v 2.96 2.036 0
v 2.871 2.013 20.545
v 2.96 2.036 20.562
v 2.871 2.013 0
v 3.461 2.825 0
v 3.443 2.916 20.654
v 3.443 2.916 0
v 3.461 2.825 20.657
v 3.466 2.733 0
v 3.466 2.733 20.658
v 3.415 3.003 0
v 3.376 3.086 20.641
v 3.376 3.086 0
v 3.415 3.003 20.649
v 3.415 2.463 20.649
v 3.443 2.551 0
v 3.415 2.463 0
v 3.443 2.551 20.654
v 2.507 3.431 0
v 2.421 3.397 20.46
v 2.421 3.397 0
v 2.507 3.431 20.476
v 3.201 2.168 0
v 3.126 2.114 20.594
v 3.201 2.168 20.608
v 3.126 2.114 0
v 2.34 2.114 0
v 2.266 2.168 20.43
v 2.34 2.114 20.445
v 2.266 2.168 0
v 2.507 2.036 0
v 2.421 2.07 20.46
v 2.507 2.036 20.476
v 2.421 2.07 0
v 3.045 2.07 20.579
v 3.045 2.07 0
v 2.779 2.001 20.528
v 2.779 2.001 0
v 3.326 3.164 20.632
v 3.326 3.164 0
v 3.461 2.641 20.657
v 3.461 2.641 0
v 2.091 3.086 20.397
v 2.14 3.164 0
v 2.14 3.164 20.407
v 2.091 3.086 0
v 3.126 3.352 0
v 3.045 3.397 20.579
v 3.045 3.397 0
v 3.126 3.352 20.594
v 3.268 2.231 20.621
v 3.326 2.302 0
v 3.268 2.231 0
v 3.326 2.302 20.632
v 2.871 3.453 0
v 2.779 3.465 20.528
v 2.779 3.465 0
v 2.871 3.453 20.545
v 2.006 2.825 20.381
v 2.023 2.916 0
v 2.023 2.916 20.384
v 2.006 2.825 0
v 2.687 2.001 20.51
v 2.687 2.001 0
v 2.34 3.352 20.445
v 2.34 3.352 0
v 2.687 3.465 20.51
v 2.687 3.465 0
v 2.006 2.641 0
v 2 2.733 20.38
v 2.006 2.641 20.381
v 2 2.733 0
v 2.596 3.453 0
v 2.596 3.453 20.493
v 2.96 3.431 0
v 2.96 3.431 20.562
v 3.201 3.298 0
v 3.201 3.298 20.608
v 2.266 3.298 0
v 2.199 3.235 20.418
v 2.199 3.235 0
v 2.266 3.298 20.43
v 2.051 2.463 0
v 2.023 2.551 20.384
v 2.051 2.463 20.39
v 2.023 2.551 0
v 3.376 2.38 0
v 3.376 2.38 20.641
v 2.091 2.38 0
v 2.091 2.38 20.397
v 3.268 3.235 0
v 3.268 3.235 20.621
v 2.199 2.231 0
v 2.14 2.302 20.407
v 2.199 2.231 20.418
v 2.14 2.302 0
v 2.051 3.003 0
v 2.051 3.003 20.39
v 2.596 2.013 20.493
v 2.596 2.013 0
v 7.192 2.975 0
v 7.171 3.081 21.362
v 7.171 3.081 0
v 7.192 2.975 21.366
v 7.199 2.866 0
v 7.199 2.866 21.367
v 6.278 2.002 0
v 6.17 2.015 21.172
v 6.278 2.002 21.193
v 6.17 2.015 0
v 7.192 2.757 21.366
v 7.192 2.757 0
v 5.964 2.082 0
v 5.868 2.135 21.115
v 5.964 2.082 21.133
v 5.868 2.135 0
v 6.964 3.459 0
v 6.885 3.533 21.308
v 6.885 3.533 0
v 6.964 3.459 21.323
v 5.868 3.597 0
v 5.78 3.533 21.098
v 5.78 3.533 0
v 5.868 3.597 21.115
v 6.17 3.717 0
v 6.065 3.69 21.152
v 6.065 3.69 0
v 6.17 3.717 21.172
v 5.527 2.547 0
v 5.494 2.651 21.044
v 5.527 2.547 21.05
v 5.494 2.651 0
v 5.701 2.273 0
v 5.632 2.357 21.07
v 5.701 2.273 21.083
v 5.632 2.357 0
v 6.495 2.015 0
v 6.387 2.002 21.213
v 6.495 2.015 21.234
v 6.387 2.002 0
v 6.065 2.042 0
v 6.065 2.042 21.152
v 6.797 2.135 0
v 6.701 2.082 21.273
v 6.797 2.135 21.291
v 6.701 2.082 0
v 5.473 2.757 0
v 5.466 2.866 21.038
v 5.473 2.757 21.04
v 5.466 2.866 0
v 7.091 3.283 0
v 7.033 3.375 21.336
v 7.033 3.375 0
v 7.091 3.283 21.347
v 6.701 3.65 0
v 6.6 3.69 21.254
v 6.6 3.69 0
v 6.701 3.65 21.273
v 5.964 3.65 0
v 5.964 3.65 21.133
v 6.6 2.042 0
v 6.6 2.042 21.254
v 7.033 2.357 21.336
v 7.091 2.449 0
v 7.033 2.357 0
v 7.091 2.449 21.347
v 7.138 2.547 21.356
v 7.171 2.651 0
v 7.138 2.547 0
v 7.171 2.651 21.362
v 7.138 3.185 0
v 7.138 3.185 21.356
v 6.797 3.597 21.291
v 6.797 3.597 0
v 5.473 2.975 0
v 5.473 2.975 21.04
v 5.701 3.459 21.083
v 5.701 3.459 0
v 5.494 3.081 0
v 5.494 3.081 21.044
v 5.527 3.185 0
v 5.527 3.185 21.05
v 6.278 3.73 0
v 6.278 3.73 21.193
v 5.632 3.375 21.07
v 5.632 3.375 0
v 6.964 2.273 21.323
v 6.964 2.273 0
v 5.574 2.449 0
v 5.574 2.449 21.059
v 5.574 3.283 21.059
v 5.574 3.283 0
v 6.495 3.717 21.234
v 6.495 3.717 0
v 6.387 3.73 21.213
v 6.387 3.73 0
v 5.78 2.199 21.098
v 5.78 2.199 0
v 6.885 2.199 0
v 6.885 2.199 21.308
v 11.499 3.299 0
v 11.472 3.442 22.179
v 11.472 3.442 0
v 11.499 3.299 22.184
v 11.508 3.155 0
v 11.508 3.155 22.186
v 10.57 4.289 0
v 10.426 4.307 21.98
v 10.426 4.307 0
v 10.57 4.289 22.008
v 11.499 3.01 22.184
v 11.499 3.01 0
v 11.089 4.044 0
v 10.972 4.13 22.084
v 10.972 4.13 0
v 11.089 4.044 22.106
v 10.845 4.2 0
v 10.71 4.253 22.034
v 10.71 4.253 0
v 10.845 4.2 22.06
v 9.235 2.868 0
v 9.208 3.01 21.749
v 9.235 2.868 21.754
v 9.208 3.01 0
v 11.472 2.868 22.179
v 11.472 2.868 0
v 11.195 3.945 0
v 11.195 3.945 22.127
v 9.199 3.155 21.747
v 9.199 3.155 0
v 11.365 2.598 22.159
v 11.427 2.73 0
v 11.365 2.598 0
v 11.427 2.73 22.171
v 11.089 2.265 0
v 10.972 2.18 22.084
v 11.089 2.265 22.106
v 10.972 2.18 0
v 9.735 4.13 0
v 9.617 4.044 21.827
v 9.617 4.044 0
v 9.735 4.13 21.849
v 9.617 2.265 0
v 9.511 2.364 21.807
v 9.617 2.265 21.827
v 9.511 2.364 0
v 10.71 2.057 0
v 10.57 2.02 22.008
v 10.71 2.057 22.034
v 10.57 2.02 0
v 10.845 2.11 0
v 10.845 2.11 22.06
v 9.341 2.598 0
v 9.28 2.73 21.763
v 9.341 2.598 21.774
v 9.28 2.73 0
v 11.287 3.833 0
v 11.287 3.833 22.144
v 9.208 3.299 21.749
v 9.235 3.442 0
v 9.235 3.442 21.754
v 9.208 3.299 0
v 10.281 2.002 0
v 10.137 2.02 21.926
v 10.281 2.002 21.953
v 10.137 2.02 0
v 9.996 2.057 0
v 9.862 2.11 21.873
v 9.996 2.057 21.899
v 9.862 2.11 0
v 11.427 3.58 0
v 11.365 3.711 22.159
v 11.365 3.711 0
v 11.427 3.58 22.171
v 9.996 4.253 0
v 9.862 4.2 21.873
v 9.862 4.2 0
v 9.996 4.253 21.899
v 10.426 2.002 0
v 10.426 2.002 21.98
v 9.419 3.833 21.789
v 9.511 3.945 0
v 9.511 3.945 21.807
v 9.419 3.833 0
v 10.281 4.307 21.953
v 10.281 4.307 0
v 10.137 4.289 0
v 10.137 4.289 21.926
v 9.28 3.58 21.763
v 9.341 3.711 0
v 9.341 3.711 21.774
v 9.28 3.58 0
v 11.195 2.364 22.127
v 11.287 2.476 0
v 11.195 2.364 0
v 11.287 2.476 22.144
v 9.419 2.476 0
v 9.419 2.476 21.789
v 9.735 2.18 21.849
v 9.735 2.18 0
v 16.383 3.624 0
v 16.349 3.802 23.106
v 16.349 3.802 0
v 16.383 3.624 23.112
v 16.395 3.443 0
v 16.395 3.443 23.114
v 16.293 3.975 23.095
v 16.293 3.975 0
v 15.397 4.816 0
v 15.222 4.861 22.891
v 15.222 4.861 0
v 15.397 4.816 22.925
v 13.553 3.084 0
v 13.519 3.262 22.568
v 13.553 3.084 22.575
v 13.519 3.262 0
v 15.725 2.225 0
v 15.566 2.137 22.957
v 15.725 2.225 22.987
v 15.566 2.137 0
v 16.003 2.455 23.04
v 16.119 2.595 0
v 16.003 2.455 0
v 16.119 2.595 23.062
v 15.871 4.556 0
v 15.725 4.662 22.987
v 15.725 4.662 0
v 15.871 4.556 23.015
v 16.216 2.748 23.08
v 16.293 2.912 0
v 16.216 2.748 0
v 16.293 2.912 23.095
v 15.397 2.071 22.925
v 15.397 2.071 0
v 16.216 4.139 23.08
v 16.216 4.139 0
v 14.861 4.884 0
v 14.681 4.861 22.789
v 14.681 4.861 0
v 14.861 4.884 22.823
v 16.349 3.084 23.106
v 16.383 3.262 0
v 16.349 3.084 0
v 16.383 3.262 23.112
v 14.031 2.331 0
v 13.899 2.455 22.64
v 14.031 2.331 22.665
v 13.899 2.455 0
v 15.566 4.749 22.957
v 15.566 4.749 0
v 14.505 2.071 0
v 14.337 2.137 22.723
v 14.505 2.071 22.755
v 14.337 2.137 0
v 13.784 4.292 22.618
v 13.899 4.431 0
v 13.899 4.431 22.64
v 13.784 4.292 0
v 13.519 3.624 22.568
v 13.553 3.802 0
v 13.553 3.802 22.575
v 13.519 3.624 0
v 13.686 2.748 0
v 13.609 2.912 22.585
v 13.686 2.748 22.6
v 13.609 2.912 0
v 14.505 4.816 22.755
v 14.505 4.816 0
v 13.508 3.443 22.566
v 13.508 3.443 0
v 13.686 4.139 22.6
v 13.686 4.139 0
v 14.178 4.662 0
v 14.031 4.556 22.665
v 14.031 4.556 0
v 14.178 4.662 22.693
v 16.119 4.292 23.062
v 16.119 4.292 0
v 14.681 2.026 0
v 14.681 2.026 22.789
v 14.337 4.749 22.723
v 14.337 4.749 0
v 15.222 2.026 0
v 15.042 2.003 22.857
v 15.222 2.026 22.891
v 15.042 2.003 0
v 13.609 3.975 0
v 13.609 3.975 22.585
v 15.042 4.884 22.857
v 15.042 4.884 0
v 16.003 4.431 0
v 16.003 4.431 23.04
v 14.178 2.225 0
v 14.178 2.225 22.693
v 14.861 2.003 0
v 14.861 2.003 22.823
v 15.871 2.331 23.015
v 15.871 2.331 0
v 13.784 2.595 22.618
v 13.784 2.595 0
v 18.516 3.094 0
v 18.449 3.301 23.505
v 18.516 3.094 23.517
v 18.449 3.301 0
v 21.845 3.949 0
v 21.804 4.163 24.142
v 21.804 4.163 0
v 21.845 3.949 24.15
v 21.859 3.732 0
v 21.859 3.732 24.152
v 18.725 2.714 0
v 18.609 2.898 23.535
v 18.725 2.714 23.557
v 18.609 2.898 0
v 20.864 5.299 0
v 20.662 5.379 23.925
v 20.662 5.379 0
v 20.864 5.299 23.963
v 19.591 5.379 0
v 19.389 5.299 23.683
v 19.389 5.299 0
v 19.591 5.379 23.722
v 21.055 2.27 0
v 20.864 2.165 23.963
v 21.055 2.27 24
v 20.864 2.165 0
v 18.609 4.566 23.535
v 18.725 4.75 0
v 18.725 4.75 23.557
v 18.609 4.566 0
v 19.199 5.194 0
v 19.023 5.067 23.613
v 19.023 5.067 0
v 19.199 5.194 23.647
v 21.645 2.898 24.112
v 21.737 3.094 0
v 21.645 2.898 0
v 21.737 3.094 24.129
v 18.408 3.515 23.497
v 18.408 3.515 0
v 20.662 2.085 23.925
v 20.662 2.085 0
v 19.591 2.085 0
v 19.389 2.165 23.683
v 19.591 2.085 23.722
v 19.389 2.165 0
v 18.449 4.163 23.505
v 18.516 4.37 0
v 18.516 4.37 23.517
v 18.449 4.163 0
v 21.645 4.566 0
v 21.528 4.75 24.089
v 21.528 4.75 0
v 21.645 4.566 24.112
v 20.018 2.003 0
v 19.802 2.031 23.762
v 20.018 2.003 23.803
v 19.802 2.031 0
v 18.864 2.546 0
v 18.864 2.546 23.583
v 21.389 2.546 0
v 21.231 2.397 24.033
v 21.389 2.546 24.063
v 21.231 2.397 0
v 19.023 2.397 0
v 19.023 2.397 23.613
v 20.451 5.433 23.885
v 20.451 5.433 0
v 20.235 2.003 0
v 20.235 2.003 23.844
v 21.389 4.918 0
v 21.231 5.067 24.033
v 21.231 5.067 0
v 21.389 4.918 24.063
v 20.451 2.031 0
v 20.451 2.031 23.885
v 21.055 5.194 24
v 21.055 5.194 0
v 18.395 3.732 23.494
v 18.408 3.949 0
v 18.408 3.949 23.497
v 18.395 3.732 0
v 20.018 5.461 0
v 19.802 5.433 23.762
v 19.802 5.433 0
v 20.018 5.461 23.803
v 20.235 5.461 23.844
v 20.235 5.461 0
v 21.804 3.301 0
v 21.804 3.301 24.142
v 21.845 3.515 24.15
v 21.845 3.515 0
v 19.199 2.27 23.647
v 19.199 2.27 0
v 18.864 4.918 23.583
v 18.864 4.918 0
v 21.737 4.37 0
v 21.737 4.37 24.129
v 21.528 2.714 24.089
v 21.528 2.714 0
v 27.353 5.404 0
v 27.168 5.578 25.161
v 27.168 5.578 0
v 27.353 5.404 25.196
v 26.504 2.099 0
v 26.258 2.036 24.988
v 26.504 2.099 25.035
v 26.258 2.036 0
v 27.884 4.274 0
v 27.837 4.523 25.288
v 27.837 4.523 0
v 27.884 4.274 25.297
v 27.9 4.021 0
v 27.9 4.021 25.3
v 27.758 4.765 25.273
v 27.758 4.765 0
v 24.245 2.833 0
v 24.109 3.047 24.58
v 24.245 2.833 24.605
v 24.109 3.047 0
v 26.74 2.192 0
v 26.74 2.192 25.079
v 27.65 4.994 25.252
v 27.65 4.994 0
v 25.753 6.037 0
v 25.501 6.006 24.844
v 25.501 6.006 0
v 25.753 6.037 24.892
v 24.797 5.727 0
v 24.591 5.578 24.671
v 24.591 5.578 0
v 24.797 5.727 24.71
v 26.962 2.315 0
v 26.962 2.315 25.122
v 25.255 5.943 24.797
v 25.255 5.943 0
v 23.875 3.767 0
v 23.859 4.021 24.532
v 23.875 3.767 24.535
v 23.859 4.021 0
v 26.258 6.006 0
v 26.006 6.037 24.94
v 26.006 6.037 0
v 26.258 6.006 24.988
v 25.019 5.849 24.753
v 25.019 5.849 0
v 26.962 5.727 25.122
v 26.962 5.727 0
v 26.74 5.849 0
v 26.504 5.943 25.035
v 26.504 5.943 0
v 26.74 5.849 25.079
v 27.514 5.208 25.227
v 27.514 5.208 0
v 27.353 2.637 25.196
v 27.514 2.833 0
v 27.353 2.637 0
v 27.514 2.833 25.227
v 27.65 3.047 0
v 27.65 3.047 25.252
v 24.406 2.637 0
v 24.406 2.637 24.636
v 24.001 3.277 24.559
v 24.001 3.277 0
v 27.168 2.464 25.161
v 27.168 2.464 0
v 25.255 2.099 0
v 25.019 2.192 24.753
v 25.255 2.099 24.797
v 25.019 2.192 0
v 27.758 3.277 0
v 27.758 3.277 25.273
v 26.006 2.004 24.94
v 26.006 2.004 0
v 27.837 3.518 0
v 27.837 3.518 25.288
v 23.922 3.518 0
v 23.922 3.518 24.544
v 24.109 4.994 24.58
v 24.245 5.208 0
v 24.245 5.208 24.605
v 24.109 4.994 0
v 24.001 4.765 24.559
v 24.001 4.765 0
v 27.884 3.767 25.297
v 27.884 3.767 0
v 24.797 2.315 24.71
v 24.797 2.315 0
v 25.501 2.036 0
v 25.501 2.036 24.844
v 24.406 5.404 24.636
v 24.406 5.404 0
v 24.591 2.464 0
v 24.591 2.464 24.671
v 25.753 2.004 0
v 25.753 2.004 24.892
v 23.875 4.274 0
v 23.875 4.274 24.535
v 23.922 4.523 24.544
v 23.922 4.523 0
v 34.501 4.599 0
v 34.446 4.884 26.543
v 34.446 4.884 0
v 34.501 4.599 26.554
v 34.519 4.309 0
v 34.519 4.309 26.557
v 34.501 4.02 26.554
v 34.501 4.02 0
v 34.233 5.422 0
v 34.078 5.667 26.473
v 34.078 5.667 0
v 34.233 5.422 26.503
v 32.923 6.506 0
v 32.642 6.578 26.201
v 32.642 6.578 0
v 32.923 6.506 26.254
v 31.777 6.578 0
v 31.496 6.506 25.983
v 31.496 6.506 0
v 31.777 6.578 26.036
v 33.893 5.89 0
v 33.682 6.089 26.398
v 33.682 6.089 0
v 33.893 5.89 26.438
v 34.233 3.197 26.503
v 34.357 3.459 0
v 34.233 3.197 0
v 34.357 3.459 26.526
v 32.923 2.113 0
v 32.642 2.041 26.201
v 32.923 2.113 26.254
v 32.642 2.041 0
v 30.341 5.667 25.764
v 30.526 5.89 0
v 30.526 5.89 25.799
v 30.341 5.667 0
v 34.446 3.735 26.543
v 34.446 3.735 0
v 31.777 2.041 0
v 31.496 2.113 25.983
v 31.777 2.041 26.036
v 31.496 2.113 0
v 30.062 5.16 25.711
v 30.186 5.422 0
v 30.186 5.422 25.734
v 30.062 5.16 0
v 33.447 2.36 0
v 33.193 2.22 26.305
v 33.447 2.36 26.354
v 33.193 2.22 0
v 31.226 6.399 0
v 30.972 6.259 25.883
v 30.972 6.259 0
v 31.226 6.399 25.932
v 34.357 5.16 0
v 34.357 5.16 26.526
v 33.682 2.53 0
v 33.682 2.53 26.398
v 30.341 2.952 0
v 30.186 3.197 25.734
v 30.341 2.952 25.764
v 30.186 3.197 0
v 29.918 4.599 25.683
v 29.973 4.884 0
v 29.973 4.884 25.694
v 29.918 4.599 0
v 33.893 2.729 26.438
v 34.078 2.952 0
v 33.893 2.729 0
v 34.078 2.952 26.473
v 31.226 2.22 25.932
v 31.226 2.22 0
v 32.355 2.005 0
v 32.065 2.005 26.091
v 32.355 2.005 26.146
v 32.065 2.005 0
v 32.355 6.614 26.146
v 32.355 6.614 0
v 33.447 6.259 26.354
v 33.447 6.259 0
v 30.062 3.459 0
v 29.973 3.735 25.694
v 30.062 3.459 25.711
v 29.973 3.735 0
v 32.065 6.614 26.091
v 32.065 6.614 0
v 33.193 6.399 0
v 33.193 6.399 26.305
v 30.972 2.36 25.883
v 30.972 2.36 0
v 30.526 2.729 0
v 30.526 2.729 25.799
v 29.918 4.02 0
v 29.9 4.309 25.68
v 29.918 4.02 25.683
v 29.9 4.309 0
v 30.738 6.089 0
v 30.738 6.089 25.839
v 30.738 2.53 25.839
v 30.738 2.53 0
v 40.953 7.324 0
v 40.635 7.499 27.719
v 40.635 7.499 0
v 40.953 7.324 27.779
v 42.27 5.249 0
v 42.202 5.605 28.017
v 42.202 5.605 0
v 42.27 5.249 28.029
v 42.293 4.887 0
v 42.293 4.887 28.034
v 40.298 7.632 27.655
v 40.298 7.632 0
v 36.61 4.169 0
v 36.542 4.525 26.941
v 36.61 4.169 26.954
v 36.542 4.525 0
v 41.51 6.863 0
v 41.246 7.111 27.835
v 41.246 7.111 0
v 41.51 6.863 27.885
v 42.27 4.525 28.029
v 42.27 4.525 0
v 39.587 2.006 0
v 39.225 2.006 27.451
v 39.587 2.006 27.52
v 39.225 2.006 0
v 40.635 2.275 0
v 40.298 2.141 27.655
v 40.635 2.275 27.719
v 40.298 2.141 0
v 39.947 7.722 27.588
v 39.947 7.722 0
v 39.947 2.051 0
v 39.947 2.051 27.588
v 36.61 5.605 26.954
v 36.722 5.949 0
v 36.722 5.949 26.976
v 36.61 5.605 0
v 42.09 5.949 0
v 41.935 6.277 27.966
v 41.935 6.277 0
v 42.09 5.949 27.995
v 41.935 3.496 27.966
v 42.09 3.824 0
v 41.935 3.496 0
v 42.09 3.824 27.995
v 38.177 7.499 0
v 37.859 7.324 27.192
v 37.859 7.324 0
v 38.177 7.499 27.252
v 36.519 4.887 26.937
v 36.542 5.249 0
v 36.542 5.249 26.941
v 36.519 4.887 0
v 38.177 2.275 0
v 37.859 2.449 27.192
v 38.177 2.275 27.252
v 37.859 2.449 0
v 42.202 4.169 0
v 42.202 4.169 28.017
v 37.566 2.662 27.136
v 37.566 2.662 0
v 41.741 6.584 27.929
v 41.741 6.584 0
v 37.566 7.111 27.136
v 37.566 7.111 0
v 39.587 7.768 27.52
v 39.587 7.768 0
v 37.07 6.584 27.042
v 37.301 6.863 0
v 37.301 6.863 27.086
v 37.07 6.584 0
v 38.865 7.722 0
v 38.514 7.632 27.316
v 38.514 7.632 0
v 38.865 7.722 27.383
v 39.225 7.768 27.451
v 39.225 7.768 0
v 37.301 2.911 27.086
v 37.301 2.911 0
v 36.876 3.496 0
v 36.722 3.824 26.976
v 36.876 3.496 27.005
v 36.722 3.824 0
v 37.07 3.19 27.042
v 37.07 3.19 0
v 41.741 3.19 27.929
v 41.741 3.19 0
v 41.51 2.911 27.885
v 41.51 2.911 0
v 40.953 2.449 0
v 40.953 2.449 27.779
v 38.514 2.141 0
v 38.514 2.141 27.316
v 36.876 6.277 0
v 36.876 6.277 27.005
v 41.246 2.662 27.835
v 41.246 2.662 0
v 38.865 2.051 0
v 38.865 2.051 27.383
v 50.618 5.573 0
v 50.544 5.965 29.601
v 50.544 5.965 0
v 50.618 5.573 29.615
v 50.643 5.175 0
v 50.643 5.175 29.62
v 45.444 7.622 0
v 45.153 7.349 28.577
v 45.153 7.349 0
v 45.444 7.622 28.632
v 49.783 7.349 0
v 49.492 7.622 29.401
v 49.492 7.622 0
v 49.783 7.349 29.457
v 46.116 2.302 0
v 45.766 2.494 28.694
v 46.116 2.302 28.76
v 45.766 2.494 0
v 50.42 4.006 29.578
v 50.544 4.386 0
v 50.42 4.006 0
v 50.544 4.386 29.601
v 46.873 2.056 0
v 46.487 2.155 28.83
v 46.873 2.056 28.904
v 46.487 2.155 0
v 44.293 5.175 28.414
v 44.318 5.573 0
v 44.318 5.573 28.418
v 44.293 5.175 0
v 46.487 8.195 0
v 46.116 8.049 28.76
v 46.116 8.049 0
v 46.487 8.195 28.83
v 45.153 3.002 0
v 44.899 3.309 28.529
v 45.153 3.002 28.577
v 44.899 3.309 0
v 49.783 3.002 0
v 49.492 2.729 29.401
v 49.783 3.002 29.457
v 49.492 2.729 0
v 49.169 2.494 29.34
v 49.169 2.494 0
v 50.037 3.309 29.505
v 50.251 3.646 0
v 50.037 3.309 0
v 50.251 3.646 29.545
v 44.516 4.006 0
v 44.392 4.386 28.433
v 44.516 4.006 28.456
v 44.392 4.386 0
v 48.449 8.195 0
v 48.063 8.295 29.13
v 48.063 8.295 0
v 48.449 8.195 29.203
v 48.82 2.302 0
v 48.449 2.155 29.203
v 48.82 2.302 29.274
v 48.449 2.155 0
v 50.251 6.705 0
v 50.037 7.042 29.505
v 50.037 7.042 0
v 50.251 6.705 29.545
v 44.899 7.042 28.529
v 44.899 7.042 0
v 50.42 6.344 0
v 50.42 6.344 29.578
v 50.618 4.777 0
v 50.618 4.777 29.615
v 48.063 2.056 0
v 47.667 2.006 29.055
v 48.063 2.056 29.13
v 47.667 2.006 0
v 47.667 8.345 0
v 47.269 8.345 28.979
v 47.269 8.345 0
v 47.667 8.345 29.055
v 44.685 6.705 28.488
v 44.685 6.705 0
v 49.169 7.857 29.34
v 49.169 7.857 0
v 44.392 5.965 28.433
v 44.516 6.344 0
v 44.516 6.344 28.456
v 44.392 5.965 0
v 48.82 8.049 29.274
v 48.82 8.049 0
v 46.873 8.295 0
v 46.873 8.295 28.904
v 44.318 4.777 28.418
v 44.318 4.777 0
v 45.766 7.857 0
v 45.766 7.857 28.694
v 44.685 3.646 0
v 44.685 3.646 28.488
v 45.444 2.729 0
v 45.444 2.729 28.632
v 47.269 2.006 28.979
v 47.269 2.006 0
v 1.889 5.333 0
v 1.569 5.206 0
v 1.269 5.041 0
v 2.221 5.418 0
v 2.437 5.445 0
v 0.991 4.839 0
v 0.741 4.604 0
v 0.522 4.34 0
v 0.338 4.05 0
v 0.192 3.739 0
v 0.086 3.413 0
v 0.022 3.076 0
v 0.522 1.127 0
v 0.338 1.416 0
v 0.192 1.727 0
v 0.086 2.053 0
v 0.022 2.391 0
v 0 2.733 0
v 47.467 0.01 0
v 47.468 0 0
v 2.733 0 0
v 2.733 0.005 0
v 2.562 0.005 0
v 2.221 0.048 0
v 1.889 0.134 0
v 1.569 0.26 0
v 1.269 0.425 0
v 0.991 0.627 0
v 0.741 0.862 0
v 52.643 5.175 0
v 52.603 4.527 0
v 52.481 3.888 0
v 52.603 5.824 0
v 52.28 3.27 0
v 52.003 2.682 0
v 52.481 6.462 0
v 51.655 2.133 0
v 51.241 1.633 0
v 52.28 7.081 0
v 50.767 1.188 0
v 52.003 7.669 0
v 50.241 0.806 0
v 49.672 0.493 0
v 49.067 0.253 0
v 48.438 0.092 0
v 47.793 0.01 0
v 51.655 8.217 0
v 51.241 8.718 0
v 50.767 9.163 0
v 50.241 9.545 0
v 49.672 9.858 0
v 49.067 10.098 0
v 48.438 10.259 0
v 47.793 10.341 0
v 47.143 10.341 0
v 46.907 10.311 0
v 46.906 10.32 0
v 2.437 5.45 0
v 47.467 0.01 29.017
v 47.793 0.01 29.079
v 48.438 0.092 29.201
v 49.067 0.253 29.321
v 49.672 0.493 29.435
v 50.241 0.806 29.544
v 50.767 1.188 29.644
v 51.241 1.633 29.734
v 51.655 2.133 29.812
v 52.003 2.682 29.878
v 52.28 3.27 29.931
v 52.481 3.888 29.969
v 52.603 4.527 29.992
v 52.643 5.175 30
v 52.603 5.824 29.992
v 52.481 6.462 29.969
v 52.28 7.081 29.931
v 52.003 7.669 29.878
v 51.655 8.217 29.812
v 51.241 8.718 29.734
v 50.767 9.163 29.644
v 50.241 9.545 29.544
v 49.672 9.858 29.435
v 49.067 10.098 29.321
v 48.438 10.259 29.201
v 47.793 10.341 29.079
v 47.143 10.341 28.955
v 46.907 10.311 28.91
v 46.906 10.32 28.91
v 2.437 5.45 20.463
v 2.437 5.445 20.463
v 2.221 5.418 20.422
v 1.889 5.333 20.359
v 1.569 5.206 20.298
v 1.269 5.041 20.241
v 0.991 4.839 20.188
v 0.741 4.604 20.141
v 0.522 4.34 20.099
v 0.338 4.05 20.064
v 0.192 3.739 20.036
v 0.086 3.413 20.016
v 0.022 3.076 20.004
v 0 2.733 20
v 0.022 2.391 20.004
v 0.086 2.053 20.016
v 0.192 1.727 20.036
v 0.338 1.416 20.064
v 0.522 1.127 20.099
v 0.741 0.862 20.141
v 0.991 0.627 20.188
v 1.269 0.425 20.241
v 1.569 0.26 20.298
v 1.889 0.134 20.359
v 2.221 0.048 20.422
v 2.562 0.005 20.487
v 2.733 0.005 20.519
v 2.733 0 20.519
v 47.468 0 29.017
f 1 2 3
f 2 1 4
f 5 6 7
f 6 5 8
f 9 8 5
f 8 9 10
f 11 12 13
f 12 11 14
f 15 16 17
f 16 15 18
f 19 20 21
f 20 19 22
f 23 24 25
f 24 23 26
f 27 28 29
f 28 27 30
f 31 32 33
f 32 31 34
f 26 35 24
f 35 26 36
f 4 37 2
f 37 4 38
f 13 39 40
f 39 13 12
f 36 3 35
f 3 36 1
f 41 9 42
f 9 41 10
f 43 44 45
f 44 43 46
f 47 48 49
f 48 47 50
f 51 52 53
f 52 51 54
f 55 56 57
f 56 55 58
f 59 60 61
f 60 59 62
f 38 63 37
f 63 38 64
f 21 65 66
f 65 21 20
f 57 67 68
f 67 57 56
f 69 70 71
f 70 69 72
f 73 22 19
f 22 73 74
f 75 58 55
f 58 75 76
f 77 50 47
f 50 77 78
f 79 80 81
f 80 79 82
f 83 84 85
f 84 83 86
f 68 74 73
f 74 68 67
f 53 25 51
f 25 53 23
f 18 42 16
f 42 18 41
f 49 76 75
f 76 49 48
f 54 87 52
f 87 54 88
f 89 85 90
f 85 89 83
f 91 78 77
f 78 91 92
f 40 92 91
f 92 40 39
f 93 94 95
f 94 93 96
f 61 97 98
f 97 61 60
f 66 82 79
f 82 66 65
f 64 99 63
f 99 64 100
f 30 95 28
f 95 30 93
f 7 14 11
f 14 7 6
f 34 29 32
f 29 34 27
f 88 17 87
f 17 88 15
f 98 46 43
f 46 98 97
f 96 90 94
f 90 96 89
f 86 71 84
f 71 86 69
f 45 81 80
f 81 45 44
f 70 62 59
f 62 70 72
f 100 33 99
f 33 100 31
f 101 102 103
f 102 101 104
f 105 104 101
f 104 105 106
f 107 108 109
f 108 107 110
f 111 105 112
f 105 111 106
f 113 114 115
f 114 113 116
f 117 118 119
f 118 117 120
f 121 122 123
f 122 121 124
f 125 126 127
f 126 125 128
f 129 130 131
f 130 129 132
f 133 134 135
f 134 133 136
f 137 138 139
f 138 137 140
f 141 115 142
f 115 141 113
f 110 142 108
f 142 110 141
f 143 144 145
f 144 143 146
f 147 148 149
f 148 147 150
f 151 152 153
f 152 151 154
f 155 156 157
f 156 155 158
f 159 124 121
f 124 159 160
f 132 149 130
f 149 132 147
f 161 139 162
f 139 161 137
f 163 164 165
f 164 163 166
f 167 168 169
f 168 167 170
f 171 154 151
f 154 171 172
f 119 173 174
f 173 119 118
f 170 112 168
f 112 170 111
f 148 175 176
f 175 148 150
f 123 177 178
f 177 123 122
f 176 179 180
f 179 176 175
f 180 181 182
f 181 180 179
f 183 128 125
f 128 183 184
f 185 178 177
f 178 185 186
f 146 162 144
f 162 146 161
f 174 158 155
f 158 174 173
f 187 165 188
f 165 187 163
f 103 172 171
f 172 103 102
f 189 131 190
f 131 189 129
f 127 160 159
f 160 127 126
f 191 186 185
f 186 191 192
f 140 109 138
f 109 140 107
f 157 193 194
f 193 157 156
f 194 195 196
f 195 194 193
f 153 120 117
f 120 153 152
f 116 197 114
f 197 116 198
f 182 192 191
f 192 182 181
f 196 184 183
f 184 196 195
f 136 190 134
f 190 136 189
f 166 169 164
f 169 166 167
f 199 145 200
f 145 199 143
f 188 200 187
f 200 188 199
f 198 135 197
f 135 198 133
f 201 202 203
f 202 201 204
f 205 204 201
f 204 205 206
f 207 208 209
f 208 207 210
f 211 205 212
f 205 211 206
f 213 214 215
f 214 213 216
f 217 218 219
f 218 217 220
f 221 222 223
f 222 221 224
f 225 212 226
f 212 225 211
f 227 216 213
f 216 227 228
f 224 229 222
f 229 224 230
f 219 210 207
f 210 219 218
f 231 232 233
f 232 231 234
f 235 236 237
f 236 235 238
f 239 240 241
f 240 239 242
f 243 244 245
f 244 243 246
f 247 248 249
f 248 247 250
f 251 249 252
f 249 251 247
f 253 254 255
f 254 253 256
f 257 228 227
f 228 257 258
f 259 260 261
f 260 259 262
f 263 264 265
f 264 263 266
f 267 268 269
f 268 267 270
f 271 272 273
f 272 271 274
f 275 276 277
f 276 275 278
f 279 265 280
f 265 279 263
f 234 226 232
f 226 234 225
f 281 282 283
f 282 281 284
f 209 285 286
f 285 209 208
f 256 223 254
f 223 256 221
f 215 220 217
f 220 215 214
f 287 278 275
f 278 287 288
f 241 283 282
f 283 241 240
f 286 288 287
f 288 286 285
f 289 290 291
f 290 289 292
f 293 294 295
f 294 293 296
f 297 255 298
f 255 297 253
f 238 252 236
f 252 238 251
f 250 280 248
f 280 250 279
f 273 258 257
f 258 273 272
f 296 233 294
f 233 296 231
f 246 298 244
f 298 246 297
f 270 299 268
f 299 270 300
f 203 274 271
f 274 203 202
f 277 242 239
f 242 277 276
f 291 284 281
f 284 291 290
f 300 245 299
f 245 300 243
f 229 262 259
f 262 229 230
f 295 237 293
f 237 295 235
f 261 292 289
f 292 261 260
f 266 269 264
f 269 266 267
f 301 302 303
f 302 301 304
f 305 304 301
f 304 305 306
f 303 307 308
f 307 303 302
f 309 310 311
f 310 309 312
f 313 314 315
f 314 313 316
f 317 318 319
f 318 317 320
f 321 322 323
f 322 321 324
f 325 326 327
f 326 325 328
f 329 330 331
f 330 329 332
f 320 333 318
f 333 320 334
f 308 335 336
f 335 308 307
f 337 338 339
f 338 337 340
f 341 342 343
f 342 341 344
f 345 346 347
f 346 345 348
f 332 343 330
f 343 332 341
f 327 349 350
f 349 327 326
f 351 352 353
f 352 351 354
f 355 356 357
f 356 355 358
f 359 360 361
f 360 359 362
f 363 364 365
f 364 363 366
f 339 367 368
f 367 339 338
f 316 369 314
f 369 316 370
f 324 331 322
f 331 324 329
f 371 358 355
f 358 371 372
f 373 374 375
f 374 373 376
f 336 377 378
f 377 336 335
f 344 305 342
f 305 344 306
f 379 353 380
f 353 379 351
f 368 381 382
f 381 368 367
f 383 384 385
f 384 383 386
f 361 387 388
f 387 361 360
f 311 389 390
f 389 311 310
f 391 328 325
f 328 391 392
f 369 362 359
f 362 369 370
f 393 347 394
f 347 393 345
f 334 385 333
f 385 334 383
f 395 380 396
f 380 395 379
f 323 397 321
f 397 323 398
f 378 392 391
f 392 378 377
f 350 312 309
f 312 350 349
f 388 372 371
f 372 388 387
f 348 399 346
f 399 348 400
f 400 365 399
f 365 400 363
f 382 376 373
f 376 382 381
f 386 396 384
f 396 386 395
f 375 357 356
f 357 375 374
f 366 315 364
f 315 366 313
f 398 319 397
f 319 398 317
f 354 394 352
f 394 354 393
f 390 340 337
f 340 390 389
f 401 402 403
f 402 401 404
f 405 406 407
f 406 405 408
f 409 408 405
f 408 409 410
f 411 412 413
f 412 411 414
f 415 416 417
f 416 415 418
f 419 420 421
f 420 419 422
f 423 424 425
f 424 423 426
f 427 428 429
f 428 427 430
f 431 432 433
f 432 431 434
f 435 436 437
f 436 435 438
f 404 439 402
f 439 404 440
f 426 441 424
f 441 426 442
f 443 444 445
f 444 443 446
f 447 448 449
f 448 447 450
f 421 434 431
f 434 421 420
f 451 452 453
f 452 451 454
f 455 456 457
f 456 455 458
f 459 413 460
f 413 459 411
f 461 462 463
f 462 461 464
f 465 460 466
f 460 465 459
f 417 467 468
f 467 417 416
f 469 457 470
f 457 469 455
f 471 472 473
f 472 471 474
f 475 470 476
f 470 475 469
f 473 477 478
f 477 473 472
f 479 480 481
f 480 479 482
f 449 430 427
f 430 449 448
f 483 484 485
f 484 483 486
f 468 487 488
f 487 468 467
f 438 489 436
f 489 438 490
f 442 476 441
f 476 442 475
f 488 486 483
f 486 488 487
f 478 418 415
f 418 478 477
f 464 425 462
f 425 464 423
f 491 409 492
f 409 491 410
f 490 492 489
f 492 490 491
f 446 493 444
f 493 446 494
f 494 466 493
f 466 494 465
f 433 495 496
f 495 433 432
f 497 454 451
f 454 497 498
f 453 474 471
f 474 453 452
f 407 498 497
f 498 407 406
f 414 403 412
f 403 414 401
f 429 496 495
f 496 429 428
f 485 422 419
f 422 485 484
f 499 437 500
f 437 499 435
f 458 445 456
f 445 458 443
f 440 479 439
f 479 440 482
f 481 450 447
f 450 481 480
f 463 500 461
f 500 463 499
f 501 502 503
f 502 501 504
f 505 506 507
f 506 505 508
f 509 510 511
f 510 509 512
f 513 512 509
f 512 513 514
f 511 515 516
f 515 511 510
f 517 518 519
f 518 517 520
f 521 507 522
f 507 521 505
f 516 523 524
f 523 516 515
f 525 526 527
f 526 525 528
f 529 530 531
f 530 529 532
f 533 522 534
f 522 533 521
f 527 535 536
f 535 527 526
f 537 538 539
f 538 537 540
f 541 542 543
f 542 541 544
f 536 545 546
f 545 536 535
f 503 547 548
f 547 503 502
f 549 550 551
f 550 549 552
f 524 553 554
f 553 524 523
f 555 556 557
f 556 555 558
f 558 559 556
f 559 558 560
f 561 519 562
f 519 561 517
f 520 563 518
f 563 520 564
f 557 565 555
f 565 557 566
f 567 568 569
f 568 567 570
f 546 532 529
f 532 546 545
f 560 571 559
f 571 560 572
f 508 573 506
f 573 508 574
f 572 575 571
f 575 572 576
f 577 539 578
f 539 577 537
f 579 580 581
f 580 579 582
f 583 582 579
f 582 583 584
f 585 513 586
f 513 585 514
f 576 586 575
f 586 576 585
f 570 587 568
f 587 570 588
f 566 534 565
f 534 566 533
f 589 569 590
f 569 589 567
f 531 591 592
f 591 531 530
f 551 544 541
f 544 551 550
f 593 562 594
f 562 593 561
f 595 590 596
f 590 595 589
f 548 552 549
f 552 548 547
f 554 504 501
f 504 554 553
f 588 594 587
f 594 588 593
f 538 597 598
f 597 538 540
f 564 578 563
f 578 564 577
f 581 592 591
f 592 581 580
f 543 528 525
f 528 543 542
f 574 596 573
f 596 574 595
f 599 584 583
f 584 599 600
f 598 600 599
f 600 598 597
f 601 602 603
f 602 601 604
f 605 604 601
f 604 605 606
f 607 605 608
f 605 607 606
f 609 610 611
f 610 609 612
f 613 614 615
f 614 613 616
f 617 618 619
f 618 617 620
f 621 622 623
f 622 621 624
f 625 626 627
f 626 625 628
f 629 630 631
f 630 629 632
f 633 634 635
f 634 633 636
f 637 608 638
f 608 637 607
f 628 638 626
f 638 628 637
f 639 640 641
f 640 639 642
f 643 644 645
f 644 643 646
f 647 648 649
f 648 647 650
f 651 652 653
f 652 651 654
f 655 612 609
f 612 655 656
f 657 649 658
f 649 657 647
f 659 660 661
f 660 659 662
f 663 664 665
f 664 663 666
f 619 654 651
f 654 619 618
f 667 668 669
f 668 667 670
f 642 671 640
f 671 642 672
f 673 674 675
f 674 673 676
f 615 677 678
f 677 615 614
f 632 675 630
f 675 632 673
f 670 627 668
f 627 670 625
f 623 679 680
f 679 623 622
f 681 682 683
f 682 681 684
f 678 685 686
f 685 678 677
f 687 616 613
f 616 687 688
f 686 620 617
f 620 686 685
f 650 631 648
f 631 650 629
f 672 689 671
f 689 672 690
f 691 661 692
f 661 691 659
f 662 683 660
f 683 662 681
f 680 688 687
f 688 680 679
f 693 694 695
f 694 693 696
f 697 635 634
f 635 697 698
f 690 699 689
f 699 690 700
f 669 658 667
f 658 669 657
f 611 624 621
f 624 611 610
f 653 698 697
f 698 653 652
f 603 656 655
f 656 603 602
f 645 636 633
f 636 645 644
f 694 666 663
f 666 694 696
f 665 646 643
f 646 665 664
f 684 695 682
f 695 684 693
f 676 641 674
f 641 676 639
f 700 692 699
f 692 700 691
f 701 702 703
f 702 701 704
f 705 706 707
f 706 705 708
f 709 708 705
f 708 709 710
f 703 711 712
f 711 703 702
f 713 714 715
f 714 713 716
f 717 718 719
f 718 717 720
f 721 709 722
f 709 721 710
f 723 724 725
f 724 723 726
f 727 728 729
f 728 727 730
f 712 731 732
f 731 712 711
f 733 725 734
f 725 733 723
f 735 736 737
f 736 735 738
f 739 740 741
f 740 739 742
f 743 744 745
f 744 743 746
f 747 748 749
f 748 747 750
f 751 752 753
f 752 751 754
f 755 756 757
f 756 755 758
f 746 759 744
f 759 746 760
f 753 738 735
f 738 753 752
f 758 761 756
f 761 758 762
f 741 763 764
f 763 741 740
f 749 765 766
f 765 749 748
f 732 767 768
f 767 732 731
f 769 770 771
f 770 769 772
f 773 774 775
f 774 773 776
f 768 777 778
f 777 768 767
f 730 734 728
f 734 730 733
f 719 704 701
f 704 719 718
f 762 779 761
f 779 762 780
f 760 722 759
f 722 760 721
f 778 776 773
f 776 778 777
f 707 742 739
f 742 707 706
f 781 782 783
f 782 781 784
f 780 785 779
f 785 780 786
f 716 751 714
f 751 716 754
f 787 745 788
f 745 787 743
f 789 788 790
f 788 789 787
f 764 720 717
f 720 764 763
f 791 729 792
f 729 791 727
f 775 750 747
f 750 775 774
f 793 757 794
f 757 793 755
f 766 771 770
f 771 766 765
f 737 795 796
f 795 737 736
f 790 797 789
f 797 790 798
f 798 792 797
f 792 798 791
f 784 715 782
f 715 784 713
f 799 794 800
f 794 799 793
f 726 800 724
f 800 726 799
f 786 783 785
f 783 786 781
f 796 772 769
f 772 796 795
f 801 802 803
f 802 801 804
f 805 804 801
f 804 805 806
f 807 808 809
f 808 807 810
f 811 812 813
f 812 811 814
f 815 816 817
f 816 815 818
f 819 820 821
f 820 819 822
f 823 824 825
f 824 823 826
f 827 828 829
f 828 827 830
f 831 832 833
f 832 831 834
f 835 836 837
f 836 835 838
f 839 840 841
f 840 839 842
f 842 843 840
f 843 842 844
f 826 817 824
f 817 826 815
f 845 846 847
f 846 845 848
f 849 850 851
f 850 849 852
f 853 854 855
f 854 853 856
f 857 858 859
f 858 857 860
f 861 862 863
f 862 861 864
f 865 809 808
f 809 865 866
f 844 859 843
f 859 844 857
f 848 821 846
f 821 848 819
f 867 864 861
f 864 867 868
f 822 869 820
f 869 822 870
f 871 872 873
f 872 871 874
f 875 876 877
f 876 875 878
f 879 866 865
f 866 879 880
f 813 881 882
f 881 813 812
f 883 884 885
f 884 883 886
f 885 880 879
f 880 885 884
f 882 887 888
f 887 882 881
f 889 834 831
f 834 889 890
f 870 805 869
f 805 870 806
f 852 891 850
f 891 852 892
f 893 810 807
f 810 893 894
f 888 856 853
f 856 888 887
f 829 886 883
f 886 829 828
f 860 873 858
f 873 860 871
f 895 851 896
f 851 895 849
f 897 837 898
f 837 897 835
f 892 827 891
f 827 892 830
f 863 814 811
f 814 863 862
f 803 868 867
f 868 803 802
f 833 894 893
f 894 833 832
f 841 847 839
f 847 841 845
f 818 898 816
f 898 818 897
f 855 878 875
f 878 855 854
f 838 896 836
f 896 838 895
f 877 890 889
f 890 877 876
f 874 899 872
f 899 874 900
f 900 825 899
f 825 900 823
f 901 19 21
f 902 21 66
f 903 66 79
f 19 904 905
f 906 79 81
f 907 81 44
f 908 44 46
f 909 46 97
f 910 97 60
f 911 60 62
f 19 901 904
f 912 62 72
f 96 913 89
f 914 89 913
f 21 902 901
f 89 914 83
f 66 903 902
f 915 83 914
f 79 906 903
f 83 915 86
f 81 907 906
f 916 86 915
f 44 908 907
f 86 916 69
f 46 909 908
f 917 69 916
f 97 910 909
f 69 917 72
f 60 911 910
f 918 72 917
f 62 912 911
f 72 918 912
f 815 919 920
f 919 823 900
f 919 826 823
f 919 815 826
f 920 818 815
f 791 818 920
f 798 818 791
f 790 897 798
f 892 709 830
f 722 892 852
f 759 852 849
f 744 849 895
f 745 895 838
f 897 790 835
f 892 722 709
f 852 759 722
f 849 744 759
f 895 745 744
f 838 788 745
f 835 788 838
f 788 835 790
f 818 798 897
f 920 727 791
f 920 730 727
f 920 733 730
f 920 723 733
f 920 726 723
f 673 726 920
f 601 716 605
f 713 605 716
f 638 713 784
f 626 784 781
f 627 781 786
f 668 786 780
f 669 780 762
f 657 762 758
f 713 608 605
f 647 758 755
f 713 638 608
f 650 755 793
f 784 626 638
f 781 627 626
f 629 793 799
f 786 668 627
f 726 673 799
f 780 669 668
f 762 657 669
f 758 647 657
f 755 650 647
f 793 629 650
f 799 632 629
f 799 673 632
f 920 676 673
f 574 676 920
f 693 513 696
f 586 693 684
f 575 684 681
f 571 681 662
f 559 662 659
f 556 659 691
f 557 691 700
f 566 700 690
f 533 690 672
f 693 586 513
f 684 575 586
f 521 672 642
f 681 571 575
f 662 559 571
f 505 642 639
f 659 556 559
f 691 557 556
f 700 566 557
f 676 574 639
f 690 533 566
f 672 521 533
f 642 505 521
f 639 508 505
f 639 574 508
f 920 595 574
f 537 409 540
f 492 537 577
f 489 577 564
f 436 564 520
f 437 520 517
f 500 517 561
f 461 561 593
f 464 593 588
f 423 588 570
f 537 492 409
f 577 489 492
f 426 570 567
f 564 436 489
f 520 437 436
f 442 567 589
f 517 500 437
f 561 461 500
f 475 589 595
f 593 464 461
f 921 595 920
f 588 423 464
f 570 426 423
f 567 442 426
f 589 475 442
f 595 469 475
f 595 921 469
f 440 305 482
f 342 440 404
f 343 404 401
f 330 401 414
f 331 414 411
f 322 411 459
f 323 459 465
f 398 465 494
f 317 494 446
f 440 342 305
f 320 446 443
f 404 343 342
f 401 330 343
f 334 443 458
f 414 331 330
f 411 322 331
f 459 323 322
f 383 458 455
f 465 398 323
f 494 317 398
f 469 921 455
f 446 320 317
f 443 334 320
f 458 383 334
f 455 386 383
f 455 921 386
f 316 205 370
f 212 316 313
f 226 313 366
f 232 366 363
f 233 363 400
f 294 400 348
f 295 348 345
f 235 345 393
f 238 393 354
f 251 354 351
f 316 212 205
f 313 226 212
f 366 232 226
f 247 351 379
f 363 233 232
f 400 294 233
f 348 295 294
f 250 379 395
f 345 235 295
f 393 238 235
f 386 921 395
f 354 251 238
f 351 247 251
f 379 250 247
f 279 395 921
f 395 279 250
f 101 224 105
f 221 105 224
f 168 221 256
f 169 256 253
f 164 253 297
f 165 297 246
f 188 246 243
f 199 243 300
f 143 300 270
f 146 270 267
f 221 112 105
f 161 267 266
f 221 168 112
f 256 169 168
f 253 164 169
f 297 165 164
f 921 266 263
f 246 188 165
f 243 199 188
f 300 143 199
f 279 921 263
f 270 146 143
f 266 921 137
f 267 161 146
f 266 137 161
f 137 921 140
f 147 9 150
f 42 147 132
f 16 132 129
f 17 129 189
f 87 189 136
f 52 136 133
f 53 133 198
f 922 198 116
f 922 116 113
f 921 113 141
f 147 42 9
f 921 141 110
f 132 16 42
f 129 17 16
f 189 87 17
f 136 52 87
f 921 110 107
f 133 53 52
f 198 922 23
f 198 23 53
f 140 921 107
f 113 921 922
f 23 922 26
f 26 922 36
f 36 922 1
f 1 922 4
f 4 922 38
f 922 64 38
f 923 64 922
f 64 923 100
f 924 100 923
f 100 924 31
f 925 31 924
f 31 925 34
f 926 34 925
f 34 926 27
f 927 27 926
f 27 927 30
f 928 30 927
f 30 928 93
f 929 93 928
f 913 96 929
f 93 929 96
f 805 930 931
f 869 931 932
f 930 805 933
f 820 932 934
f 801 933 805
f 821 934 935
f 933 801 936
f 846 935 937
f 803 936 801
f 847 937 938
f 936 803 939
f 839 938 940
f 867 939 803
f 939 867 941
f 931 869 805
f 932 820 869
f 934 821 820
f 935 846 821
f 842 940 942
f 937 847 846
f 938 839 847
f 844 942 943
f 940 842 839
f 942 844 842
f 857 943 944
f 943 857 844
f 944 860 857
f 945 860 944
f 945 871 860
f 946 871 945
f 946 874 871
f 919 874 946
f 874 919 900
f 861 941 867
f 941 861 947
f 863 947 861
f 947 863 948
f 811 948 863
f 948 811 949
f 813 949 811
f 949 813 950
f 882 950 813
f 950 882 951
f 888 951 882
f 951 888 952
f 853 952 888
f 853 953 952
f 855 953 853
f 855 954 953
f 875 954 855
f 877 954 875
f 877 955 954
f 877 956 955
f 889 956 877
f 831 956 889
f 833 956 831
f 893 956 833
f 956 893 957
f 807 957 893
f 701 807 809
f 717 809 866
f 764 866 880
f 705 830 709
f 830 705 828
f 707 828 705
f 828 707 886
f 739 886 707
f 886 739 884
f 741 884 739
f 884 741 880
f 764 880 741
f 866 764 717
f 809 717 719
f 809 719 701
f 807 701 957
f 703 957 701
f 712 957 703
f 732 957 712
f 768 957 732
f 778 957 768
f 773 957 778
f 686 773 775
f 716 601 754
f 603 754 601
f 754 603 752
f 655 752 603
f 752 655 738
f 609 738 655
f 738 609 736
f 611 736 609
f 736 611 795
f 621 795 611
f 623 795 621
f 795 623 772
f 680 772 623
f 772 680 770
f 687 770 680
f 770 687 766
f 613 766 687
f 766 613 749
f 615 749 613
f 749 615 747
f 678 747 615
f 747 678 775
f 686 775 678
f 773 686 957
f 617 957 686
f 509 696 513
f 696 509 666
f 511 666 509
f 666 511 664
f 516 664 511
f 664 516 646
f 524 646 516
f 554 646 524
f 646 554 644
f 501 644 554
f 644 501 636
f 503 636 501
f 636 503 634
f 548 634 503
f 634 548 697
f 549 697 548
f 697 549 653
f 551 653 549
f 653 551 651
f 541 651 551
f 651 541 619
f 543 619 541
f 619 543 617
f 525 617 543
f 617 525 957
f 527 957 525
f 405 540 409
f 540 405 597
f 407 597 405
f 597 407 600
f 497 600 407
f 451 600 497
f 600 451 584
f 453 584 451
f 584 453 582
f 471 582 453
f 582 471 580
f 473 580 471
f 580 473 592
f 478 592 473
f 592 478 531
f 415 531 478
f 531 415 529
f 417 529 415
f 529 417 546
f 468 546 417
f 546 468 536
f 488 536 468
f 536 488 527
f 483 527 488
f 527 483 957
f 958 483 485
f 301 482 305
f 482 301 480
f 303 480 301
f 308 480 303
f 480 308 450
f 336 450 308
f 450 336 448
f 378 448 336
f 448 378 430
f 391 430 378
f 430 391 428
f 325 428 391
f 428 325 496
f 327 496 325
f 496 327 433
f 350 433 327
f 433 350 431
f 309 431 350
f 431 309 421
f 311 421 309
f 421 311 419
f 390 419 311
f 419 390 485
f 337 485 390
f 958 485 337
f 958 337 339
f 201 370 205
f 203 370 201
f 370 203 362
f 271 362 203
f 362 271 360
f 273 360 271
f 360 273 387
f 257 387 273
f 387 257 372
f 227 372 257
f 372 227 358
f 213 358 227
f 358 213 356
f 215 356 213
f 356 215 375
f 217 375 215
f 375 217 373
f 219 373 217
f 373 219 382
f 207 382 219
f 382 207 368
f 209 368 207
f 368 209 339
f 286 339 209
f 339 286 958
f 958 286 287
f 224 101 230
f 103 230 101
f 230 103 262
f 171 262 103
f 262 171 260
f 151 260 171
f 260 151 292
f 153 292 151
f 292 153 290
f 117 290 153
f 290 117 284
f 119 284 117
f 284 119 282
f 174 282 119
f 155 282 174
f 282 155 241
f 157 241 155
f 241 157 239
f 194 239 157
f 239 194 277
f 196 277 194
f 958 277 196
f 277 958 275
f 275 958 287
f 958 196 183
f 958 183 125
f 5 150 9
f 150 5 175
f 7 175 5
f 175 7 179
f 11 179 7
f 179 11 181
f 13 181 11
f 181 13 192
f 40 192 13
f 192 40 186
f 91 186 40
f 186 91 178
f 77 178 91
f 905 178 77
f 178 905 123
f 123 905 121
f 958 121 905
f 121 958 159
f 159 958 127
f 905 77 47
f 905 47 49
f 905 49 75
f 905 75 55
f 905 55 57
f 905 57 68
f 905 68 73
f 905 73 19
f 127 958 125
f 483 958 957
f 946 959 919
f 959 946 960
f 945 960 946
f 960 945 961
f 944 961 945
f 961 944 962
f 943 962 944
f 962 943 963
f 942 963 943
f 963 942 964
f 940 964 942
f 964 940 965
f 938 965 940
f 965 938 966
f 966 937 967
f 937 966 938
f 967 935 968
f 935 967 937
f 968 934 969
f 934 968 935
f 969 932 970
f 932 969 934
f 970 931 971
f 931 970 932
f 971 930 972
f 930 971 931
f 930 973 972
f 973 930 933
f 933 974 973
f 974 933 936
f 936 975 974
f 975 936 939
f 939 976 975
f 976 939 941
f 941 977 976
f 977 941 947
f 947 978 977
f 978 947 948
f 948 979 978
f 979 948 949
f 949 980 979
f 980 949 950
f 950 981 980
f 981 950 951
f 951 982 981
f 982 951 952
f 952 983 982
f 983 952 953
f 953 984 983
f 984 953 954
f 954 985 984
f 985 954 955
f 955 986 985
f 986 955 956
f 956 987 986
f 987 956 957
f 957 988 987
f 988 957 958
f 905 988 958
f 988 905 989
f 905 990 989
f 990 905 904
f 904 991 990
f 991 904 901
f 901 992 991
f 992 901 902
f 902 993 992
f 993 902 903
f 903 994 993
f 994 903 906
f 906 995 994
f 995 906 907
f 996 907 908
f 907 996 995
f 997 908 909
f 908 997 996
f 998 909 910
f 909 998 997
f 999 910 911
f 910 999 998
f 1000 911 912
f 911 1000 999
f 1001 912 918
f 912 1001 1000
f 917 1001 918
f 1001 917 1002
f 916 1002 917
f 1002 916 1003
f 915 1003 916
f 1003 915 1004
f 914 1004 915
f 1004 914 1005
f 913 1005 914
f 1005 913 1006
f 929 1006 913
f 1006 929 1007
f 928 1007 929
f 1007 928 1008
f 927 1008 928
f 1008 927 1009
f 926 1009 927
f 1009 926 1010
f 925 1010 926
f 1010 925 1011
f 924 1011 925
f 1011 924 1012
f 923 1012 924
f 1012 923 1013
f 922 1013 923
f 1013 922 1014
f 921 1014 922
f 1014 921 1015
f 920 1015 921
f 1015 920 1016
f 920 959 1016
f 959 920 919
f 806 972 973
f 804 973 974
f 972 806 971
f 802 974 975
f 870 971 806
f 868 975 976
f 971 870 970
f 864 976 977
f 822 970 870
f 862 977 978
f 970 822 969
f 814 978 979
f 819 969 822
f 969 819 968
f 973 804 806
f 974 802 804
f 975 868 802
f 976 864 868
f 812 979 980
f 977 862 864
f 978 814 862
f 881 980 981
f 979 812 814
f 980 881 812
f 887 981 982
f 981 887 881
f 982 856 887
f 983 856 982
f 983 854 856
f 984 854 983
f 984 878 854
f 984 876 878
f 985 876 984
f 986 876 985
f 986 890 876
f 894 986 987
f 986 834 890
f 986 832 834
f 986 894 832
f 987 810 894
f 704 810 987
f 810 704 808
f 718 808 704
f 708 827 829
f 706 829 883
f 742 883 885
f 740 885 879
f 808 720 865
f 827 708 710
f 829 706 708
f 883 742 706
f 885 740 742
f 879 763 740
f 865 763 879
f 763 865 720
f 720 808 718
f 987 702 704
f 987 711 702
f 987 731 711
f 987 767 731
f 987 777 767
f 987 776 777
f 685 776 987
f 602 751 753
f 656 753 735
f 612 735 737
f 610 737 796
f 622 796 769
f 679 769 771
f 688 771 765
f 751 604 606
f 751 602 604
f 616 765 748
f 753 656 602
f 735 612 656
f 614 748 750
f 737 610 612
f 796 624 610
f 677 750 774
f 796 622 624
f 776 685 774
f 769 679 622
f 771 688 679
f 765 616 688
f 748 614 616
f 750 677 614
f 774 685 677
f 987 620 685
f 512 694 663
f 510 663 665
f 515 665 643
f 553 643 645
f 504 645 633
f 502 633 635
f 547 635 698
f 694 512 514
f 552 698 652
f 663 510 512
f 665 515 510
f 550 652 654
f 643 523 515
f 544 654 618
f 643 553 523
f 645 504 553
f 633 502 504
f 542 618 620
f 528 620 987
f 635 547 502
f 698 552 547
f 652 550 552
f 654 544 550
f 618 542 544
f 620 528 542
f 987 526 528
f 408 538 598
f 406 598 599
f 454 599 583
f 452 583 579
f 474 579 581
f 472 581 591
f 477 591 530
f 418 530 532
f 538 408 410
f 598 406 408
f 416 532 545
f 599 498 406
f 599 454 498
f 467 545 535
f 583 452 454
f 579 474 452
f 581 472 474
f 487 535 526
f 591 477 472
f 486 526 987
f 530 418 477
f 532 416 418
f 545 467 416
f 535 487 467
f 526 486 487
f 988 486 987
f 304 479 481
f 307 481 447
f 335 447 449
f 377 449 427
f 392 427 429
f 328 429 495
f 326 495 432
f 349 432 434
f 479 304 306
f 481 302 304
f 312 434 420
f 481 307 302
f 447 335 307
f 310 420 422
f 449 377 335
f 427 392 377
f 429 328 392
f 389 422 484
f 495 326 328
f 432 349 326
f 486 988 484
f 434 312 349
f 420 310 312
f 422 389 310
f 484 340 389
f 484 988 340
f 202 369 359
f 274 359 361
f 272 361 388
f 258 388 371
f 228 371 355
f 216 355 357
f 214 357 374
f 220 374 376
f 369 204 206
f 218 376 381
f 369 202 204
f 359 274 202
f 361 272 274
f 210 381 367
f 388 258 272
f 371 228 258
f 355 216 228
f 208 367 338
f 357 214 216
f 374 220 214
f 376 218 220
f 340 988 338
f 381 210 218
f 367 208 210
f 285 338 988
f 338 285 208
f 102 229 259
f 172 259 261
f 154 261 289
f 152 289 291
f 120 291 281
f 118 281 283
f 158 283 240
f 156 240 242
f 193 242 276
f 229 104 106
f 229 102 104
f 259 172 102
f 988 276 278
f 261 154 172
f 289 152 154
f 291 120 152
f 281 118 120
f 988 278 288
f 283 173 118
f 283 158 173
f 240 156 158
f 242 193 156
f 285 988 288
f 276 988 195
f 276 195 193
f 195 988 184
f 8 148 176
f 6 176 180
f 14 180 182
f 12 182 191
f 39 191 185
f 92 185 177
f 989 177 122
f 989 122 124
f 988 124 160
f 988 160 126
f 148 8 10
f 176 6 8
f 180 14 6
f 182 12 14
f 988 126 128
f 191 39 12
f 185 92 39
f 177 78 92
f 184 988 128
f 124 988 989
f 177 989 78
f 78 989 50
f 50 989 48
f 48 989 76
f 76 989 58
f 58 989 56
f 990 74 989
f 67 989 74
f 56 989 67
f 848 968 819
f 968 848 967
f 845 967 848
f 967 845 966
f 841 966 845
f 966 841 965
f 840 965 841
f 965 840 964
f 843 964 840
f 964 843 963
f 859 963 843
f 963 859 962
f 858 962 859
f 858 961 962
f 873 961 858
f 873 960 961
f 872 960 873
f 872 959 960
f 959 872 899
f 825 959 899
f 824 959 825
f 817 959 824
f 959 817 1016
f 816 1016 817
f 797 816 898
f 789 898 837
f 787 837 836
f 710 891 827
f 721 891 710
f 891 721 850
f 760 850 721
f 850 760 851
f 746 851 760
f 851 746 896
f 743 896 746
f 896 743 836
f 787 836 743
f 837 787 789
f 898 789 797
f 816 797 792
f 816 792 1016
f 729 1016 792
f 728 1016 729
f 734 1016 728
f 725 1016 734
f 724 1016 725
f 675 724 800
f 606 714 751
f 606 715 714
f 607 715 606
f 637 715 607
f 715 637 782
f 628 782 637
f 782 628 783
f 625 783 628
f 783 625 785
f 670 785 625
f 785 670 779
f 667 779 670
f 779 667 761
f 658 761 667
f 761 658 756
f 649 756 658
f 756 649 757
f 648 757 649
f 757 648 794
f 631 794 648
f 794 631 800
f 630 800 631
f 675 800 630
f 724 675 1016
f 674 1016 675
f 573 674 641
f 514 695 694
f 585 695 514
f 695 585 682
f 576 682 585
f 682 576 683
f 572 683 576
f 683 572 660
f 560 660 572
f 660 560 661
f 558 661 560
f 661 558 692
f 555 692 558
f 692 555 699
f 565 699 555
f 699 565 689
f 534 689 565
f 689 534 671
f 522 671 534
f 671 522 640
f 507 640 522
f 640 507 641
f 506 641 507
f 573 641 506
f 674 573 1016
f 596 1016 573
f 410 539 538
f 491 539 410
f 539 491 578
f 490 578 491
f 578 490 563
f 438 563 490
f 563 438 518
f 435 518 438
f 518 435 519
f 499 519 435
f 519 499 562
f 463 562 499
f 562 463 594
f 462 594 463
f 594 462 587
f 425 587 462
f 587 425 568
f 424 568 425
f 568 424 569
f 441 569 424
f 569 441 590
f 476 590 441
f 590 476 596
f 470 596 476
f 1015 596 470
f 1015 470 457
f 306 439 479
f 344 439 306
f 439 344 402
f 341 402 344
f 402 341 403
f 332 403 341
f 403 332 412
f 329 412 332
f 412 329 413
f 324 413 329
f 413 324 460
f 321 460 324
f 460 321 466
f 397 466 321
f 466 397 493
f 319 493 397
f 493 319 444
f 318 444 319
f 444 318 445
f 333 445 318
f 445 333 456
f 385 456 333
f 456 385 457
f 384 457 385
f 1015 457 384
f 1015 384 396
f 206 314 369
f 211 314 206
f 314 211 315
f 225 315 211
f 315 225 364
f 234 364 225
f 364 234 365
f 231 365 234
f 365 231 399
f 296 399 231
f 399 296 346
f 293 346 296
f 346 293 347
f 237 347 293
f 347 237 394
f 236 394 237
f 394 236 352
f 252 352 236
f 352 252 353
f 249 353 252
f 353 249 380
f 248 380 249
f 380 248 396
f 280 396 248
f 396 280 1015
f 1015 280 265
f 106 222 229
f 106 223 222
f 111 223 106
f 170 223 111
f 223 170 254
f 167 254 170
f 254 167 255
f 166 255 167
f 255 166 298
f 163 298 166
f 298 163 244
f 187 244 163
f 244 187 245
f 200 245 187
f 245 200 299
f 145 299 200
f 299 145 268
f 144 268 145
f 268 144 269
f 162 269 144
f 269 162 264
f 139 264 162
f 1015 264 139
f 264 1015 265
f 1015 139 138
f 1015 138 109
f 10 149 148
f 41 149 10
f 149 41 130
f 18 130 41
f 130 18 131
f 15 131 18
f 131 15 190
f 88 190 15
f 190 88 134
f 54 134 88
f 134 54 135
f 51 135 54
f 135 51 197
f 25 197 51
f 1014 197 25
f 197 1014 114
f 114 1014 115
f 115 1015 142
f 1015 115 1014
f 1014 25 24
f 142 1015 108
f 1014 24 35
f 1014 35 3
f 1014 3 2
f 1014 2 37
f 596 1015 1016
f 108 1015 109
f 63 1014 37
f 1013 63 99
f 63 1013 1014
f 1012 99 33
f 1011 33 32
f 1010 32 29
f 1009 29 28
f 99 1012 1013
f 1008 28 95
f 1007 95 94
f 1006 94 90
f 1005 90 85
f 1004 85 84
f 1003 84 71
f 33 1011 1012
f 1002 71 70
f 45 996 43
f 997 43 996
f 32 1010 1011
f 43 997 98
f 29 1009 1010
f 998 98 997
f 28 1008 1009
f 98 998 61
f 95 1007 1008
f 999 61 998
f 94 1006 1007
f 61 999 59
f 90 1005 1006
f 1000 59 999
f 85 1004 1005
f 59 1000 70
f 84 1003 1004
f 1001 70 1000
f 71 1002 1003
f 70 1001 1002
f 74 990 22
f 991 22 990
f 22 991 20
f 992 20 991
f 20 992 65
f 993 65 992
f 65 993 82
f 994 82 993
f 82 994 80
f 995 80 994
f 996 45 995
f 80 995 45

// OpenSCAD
// Parameters

input_diameters = [1.27,1.5,2,2.5,3,3.5,4,5,5.5];
spacing = 2;

start_height = 20;
final_height = 30;

// Useful functions
function sumv(v,i,s=0) = (i==s ? v[i] : v[i] + sumv(v,i-1,s));
function act_circle(diam) = diam / cos(30);

// Calculations
$fn=50;

allen_diameters = [for (d = input_diameters) act_circle(d)];

final_width = max(allen_diameters) + 2 * spacing;
initial_width = min(allen_diameters) + 2 * spacing;

total_spacing = spacing * (len(allen_diameters) + 1);

total_length = total_spacing
    + sumv(allen_diameters, len(allen_diameters)-1);

// Modules

module body() {
// create body
linear_extrude(height = final_height)
union() {
  y_diff = final_width - initial_width;
  x_diff = total_length - (final_width + initial_width) / 2;
  theta = atan2(y_diff, x_diff);

  unit_tan_x = cos(theta + 90);
  unit_tan_y = sin(theta + 90);

  init_circ_x = initial_width / 2;
  init_circ_y = initial_width / 2;

  final_circ_x = total_length - final_width / 2;
  final_circ_y = final_width / 2;

  tan_x_1 = unit_tan_x * initial_width / 2 + init_circ_x;
  tan_y_1 = unit_tan_y * initial_width / 2 + init_circ_y;

  tan_x_2 = unit_tan_x * final_width / 2 + final_circ_x;
  tan_y_2 = unit_tan_y * final_width / 2 + final_circ_y;

  // Cubic Part
  polygon([[init_circ_x, 0], // bottom left
          [final_circ_x, 0], //bottom right
          [tan_x_2, tan_y_2], // top right
          [tan_x_1, tan_y_1]]);

  // First Rounded
  translate([init_circ_x, init_circ_y, 0])
  circle(d=initial_width);

  // Larger Rounded
  translate([final_circ_x, final_circ_y, 0])
  circle(d=final_width);
}
}

module holes() {
for (i = [0:len(allen_diameters)]) {
    // translate hole to proper location
    hole_x = sumv(allen_diameters,i) + spacing*(i+1) - allen_diameters[i]/2;
    hole_y = spacing + allen_diameters[i]/2;
    translate([hole_x, hole_y, -0.5])
    // create hole
    cylinder(final_height + 1, d=allen_diameters[i]);
}
}

module top_slant() {
    translate([0,0,start_height])
    rotate([0, -atan2(final_height - start_height, total_length),0])
    translate([-0.5,-0.5,0])
    cube([total_length * 2, final_width + 1, final_height]);
}

// Final

difference() {
body();
holes();
top_slant();
}
